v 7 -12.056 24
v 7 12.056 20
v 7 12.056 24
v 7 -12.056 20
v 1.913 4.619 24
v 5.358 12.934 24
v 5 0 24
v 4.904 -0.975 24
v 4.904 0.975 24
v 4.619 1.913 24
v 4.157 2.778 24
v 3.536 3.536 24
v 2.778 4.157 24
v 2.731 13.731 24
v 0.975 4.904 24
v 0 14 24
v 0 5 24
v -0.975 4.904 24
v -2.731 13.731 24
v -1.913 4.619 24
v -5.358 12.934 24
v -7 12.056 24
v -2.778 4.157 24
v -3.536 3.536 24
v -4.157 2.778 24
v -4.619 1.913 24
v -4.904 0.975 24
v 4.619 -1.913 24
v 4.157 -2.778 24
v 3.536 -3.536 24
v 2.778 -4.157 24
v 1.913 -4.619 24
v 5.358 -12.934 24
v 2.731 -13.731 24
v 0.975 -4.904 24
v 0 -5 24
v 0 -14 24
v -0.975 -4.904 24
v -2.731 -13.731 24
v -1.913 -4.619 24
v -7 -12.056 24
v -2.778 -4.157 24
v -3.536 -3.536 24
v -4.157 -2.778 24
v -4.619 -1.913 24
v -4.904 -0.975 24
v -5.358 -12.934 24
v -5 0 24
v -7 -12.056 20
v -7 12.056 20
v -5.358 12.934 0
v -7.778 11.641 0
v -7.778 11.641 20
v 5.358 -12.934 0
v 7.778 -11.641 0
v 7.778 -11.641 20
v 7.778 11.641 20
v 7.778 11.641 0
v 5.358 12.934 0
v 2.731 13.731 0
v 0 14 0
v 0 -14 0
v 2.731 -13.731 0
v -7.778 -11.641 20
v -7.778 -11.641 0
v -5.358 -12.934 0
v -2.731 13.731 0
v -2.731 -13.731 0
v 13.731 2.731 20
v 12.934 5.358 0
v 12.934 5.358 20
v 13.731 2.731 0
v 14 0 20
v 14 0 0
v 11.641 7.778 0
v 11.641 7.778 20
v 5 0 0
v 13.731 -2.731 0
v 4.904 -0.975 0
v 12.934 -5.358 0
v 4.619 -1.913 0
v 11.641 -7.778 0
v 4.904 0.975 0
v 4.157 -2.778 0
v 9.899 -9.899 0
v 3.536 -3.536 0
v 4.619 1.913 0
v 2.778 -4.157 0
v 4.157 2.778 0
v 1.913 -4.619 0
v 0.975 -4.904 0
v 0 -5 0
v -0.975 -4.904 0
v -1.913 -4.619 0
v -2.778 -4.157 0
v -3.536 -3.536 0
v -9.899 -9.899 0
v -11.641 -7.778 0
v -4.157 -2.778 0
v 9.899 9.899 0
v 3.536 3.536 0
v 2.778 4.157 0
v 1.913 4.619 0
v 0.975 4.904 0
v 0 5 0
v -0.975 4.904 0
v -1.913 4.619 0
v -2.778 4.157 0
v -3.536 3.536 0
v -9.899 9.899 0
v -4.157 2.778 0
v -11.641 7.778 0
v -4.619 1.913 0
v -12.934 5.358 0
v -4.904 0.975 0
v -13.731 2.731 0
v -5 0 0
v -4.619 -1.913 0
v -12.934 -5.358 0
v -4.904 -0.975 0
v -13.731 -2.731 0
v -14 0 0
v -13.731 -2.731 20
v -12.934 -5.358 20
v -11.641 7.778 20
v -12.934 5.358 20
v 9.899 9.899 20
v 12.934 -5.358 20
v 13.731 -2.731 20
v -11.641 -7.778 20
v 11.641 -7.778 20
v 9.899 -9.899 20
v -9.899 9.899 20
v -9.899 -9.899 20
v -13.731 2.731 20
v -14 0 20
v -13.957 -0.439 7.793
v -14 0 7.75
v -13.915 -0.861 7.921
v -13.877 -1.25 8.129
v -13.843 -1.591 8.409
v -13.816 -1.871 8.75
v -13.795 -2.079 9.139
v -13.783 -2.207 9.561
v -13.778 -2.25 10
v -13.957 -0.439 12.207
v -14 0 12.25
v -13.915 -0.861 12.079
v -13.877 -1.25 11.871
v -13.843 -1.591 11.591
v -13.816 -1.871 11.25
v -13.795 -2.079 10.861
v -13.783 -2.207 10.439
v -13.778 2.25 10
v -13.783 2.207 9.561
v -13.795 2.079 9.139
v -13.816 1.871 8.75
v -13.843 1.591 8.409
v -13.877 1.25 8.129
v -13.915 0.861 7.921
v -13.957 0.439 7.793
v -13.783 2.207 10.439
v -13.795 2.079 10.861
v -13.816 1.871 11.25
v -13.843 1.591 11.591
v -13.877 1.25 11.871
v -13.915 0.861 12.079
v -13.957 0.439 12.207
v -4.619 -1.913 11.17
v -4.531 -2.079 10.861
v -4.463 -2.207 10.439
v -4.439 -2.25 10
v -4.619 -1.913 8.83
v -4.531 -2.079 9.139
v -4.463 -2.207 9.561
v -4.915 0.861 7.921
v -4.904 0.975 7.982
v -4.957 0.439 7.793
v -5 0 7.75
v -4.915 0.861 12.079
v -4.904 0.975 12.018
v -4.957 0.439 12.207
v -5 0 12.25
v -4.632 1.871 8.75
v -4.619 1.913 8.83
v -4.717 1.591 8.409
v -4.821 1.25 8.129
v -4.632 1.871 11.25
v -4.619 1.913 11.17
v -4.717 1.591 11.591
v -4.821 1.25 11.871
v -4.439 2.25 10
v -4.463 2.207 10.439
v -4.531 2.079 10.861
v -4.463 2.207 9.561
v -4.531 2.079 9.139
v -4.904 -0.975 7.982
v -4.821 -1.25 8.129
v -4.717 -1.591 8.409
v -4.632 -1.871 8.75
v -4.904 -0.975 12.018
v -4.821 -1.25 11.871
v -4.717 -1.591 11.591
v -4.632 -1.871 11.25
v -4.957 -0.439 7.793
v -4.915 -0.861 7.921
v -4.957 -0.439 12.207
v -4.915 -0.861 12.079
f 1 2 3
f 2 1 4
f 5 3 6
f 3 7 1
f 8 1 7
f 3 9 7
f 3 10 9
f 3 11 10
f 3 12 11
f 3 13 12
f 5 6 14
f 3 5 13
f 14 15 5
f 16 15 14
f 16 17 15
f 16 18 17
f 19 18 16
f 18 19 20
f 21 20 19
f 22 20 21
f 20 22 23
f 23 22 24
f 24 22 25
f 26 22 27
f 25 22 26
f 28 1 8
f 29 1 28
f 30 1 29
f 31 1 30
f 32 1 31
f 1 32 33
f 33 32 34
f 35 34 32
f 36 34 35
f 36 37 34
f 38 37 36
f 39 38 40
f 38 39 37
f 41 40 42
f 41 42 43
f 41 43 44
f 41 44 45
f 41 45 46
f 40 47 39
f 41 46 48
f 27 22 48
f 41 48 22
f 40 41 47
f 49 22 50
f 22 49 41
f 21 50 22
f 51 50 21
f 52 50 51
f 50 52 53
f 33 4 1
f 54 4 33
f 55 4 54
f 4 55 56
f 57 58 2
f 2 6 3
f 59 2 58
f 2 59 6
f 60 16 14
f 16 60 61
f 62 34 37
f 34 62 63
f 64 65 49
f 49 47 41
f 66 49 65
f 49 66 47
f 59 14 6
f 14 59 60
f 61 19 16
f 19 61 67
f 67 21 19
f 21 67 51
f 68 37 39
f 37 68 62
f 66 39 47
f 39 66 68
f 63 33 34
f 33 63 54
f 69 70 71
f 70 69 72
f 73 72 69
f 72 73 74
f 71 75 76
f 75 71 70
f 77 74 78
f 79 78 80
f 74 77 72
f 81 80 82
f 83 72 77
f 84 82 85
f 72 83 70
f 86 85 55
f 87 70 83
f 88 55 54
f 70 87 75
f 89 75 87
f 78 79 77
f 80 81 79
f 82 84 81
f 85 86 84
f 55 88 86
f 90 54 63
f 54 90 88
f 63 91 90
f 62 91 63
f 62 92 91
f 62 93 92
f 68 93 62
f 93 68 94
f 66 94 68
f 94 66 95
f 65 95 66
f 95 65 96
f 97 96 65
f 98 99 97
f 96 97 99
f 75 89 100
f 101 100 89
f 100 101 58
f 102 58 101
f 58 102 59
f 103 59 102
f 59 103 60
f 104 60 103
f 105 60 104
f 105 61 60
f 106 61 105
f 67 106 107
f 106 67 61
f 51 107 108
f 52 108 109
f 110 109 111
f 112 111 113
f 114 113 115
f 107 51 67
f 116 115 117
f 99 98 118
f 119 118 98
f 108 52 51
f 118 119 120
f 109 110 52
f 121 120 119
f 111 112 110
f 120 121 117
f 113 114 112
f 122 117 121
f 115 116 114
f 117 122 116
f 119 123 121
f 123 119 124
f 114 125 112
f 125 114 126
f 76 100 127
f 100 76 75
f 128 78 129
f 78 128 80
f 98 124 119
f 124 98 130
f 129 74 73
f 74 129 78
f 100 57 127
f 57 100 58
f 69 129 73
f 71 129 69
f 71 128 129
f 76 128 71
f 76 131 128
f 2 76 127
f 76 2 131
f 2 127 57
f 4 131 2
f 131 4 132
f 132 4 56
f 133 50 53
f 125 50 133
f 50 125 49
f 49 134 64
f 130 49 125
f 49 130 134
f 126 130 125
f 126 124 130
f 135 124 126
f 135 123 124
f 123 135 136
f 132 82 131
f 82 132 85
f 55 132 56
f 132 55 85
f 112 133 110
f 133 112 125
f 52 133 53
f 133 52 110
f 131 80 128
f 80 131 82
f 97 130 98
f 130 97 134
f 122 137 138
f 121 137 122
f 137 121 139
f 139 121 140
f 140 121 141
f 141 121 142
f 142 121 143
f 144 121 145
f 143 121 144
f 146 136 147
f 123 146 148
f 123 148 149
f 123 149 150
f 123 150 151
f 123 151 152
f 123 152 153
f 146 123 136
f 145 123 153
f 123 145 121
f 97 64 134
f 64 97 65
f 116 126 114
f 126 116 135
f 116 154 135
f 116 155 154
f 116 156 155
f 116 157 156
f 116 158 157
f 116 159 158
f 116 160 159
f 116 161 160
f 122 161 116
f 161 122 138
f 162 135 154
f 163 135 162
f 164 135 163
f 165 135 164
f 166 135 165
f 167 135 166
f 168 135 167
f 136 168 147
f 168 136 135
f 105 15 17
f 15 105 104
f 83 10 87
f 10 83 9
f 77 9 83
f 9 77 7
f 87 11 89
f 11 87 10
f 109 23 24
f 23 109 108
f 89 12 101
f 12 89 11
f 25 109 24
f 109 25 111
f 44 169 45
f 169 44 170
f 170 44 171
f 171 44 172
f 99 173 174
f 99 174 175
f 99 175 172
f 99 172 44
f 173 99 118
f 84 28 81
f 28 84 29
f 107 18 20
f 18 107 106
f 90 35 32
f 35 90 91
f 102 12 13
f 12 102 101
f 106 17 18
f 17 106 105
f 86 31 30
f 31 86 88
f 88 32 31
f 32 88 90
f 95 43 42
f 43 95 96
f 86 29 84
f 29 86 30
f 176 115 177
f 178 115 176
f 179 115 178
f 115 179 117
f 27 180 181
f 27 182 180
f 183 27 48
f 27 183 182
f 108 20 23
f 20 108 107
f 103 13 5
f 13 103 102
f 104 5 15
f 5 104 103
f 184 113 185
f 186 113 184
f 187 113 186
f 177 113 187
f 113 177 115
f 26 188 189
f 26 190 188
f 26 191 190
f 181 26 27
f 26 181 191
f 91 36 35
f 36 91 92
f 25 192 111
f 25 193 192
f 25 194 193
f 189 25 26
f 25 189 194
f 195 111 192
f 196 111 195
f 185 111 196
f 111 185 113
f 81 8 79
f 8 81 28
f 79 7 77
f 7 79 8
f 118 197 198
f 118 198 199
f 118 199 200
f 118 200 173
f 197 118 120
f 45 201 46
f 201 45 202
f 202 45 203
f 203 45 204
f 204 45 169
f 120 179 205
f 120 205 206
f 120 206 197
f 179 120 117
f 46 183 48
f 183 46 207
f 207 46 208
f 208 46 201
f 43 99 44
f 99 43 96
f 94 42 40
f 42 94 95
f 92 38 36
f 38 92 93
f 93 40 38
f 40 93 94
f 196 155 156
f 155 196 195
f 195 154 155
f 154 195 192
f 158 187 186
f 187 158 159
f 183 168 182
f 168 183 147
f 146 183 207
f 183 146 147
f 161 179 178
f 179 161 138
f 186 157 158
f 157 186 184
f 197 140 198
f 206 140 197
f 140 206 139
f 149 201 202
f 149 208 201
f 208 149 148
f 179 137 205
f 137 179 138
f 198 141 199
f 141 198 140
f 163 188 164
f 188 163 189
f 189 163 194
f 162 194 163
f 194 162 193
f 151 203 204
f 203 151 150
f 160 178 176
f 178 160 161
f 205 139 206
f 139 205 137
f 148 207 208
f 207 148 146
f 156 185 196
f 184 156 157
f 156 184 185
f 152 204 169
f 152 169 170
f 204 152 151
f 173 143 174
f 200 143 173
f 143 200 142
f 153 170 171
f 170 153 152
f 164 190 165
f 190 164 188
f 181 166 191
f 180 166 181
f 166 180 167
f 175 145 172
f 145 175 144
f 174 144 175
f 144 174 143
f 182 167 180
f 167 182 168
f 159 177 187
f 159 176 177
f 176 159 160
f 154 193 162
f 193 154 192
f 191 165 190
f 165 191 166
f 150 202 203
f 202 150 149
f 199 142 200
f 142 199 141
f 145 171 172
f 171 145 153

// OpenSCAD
$fn = 32;

// ----------------------------------------------------------------------
// Oldham coupling hub: 28 x 24 mm
// ----------------------------------------------------------------------

// --- parameters (mm) ---
flange_dia = 28;          // hub diameter
flange_len = 20;          // hub length
hub_bore = 10;            // shaft bore
key_w = 14;               // drive tongue width
tongue_h = 4;             // drive tongue height
set_d = 4.5;              // set screw tap hole

module hub() {
  cylinder(h = flange_len, d = flange_dia);
  /* tongue, clipped to the hub disc and sunk 1 mm into the face */
  intersection() {
    translate([-key_w / 2, -flange_dia / 2, flange_len - 1])
      cube([key_w, flange_dia, tongue_h + 1]);
    translate([0, 0, flange_len - 1]) cylinder(h = tongue_h + 1, d = flange_dia);
  }
}

difference() {
  hub();
  translate([0, 0, -1]) cylinder(h = flange_len + tongue_h + 2, d = hub_bore);
  translate([-flange_dia / 2 - 1, 0, flange_len * 0.5])
    rotate([0, 90, 0]) cylinder(h = flange_dia / 2 + 2, d = set_d);
}
